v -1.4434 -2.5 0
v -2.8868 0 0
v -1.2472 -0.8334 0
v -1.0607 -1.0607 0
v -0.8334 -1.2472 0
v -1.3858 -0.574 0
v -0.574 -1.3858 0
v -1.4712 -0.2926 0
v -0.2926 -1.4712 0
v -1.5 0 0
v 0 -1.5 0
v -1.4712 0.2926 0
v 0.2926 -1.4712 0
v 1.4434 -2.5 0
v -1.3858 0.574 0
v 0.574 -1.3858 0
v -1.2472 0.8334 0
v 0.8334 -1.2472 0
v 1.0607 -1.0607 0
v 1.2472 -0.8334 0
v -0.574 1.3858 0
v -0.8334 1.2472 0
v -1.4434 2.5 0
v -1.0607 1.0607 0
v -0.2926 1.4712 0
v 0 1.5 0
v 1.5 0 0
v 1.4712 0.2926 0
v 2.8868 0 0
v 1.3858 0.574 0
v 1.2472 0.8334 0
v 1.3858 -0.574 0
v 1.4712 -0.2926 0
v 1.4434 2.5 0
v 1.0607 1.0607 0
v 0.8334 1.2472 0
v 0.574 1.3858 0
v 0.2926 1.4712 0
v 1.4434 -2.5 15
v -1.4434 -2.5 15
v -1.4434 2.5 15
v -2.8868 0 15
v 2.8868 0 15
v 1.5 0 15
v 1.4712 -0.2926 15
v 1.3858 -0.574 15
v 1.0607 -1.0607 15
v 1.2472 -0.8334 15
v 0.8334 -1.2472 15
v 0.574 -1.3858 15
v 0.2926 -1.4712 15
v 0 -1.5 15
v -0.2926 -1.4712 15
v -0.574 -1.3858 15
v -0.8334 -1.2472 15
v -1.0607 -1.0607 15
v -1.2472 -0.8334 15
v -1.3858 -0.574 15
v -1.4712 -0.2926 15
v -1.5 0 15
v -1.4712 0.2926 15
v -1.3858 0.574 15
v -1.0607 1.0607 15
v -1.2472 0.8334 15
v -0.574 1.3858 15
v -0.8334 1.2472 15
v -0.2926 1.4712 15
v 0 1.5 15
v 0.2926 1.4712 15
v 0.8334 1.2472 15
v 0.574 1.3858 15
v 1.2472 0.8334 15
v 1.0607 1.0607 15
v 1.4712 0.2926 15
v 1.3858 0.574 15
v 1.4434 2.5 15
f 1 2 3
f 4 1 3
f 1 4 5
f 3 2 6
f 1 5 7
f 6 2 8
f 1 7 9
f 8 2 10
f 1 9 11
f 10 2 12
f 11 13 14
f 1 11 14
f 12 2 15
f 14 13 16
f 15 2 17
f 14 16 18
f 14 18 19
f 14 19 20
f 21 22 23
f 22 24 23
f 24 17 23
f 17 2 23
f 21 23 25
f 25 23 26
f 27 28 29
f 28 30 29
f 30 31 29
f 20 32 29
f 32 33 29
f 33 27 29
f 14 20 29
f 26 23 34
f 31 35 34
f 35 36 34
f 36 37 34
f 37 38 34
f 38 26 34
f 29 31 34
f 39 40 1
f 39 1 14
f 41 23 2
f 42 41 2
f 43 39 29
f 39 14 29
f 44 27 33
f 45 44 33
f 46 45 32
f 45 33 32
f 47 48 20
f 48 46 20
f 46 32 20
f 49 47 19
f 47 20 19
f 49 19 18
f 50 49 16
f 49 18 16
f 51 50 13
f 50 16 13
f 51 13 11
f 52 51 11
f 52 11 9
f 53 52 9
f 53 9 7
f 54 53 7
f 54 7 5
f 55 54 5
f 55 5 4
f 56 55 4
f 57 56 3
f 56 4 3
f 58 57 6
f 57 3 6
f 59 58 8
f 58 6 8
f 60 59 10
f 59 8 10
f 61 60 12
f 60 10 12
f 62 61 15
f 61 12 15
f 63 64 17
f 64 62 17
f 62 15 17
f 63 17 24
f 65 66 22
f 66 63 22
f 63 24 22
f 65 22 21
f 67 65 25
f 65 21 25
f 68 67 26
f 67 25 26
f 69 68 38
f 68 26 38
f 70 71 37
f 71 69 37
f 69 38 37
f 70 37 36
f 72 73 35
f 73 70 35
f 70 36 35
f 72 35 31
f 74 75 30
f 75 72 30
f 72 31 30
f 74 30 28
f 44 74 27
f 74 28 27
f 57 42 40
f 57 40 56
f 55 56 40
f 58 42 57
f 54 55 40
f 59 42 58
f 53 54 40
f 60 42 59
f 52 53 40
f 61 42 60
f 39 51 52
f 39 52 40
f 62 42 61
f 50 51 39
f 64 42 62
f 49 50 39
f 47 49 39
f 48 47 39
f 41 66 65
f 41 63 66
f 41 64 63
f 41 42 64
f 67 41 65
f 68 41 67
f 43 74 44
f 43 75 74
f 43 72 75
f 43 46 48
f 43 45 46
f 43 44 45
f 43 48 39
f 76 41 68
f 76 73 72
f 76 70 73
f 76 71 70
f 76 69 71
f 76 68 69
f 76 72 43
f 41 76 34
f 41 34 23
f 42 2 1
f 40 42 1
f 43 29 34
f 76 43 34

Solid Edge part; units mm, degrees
sketch "Sketch1" plane through (0, 0, 0) normal (0, 0, 1) x (1, 0, 0)
  circle A0 centre (0, 0) radius 1.5
  line L0 (-1.4434, 2.5) -> (-2.8868, 0)
  line L1 (-2.8868, 0) -> (-1.4434, -2.5)
  line L2 (-1.4434, -2.5) -> (1.4434, -2.5)
  line L3 (1.4434, -2.5) -> (2.8868, 0)
  line L4 (2.8868, 0) -> (1.4434, 2.5)
  line L5 (1.4434, 2.5) -> (-1.4434, 2.5)
extrude "Protrusion1" add sketch "Sketch1" along normal blind 15
